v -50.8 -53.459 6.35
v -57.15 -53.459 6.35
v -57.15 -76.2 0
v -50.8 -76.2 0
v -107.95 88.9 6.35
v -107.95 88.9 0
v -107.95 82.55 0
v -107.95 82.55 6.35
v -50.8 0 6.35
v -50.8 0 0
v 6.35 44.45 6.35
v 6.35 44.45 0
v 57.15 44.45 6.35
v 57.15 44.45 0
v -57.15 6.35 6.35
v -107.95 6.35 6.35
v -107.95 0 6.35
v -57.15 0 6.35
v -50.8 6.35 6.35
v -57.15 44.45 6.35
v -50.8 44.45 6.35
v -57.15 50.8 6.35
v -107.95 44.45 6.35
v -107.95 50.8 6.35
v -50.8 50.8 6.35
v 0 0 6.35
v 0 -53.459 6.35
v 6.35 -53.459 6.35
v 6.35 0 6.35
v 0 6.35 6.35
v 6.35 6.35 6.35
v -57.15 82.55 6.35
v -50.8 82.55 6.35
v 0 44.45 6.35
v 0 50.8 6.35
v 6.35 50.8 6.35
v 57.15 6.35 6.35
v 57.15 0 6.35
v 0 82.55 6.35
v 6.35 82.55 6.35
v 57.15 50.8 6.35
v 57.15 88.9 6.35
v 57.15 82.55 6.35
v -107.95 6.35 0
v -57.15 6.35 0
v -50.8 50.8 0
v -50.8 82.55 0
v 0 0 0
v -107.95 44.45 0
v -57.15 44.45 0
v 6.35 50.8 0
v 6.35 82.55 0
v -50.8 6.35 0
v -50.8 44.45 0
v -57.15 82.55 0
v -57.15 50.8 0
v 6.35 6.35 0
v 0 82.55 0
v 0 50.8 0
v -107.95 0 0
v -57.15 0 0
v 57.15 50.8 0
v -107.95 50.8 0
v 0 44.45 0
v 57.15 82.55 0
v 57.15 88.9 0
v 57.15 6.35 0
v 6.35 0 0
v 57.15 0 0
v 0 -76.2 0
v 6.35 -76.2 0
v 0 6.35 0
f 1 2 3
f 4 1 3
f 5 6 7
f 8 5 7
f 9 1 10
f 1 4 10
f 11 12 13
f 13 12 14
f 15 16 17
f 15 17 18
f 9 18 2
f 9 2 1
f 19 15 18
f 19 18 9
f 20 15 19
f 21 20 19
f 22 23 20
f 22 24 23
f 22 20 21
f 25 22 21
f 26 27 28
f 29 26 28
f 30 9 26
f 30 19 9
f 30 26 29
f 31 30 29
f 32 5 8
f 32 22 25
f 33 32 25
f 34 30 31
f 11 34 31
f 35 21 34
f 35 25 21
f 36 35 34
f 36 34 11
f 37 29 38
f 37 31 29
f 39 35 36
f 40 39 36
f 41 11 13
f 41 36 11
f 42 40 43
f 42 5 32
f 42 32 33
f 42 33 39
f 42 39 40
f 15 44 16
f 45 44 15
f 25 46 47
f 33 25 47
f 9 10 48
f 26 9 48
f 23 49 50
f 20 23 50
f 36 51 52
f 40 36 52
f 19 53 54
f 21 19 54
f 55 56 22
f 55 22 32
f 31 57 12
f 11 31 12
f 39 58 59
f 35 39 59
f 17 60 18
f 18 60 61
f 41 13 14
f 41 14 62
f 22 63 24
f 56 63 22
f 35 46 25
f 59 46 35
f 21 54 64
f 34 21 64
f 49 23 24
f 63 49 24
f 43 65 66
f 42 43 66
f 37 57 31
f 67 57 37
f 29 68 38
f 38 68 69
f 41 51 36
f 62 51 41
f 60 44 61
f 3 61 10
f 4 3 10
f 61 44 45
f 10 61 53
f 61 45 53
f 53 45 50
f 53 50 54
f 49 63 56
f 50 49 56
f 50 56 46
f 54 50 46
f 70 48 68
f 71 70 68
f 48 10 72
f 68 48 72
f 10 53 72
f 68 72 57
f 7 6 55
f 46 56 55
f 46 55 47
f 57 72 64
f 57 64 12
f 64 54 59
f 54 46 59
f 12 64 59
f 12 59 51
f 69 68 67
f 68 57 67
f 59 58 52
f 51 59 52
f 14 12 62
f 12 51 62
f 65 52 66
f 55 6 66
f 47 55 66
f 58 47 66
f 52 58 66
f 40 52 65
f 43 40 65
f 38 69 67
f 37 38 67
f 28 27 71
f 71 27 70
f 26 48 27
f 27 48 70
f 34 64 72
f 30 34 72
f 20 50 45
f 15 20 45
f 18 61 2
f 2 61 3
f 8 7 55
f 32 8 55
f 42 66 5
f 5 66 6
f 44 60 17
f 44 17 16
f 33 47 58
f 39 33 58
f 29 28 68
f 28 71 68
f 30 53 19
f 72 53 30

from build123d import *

# Parameters (mm, degrees)
F0_W     = 6.35
F0_H     = 31.75
F0_W_2   = 50.8
F0_H_2   = 6.35
F0_H_3   = 38.1
F0_H_4   = 76.2
F1_DEPTH = 6.35
F3_DEPTH = 63.5


with BuildPart() as f1:
    # F0 (on Top) → F1 (new body)
    with BuildSketch(Plane.XY):
        Polygon((-50.8, 82.55), (0, 82.55), (6.35, 82.55), (57.15, 82.55), (57.15, 88.9), (-107.95, 88.9), (-107.95, 82.55), (-57.15, 82.55), align=None)
        with Locations((-53.975, 66.675)):
            Rectangle(F0_W, F0_H)
        with Locations((3.175, 66.675)):
            Rectangle(F0_W, F0_H)
        with Locations((31.75, 47.625)):
            Rectangle(F0_W_2, F0_H_2)
        with Locations((3.175, 47.625)):
            Rectangle(F0_W, F0_H_2)
        with Locations((-25.4, 47.625)):
            Rectangle(F0_W_2, F0_H_2)
        with Locations((-82.55, 47.625)):
            Rectangle(F0_W_2, F0_H_2)
        with Locations((-53.975, 47.625)):
            Rectangle(F0_W, F0_H_2)
        with Locations((-53.975, 25.4)):
            Rectangle(F0_W, F0_H_3)
        with Locations((3.175, 25.4)):
            Rectangle(F0_W, F0_H_3)
        with Locations((3.175, -38.1)):
            Rectangle(F0_W, F0_H_4)
        with Locations((3.175, 3.175)):
            Rectangle(F0_W, F0_H_2)
        with Locations((31.75, 3.175)):
            Rectangle(F0_W_2, F0_H_2)
        with Locations((-25.4, 3.175)):
            Rectangle(F0_W_2, F0_H_2)
        with Locations((-53.975, 3.175)):
            Rectangle(F0_W, F0_H_2)
        with Locations((-53.975, -38.1)):
            Rectangle(F0_W, F0_H_4)
        with Locations((-82.55, 3.175)):
            Rectangle(F0_W_2, F0_H_2)
    extrude(amount=F1_DEPTH)

    # F2 (on face) → F3 (cut, through all)
    with BuildSketch(Plane(origin=(-57.15, 0, 0), x_dir=(0, -1, 0), z_dir=(-1, 0, 0))):
        Polygon((53.4593649209, 6.35), (76.2, 0), (76.2, 6.35), align=None)
    extrude(amount=-F3_DEPTH, mode=Mode.SUBTRACT)


solid = f1.part
